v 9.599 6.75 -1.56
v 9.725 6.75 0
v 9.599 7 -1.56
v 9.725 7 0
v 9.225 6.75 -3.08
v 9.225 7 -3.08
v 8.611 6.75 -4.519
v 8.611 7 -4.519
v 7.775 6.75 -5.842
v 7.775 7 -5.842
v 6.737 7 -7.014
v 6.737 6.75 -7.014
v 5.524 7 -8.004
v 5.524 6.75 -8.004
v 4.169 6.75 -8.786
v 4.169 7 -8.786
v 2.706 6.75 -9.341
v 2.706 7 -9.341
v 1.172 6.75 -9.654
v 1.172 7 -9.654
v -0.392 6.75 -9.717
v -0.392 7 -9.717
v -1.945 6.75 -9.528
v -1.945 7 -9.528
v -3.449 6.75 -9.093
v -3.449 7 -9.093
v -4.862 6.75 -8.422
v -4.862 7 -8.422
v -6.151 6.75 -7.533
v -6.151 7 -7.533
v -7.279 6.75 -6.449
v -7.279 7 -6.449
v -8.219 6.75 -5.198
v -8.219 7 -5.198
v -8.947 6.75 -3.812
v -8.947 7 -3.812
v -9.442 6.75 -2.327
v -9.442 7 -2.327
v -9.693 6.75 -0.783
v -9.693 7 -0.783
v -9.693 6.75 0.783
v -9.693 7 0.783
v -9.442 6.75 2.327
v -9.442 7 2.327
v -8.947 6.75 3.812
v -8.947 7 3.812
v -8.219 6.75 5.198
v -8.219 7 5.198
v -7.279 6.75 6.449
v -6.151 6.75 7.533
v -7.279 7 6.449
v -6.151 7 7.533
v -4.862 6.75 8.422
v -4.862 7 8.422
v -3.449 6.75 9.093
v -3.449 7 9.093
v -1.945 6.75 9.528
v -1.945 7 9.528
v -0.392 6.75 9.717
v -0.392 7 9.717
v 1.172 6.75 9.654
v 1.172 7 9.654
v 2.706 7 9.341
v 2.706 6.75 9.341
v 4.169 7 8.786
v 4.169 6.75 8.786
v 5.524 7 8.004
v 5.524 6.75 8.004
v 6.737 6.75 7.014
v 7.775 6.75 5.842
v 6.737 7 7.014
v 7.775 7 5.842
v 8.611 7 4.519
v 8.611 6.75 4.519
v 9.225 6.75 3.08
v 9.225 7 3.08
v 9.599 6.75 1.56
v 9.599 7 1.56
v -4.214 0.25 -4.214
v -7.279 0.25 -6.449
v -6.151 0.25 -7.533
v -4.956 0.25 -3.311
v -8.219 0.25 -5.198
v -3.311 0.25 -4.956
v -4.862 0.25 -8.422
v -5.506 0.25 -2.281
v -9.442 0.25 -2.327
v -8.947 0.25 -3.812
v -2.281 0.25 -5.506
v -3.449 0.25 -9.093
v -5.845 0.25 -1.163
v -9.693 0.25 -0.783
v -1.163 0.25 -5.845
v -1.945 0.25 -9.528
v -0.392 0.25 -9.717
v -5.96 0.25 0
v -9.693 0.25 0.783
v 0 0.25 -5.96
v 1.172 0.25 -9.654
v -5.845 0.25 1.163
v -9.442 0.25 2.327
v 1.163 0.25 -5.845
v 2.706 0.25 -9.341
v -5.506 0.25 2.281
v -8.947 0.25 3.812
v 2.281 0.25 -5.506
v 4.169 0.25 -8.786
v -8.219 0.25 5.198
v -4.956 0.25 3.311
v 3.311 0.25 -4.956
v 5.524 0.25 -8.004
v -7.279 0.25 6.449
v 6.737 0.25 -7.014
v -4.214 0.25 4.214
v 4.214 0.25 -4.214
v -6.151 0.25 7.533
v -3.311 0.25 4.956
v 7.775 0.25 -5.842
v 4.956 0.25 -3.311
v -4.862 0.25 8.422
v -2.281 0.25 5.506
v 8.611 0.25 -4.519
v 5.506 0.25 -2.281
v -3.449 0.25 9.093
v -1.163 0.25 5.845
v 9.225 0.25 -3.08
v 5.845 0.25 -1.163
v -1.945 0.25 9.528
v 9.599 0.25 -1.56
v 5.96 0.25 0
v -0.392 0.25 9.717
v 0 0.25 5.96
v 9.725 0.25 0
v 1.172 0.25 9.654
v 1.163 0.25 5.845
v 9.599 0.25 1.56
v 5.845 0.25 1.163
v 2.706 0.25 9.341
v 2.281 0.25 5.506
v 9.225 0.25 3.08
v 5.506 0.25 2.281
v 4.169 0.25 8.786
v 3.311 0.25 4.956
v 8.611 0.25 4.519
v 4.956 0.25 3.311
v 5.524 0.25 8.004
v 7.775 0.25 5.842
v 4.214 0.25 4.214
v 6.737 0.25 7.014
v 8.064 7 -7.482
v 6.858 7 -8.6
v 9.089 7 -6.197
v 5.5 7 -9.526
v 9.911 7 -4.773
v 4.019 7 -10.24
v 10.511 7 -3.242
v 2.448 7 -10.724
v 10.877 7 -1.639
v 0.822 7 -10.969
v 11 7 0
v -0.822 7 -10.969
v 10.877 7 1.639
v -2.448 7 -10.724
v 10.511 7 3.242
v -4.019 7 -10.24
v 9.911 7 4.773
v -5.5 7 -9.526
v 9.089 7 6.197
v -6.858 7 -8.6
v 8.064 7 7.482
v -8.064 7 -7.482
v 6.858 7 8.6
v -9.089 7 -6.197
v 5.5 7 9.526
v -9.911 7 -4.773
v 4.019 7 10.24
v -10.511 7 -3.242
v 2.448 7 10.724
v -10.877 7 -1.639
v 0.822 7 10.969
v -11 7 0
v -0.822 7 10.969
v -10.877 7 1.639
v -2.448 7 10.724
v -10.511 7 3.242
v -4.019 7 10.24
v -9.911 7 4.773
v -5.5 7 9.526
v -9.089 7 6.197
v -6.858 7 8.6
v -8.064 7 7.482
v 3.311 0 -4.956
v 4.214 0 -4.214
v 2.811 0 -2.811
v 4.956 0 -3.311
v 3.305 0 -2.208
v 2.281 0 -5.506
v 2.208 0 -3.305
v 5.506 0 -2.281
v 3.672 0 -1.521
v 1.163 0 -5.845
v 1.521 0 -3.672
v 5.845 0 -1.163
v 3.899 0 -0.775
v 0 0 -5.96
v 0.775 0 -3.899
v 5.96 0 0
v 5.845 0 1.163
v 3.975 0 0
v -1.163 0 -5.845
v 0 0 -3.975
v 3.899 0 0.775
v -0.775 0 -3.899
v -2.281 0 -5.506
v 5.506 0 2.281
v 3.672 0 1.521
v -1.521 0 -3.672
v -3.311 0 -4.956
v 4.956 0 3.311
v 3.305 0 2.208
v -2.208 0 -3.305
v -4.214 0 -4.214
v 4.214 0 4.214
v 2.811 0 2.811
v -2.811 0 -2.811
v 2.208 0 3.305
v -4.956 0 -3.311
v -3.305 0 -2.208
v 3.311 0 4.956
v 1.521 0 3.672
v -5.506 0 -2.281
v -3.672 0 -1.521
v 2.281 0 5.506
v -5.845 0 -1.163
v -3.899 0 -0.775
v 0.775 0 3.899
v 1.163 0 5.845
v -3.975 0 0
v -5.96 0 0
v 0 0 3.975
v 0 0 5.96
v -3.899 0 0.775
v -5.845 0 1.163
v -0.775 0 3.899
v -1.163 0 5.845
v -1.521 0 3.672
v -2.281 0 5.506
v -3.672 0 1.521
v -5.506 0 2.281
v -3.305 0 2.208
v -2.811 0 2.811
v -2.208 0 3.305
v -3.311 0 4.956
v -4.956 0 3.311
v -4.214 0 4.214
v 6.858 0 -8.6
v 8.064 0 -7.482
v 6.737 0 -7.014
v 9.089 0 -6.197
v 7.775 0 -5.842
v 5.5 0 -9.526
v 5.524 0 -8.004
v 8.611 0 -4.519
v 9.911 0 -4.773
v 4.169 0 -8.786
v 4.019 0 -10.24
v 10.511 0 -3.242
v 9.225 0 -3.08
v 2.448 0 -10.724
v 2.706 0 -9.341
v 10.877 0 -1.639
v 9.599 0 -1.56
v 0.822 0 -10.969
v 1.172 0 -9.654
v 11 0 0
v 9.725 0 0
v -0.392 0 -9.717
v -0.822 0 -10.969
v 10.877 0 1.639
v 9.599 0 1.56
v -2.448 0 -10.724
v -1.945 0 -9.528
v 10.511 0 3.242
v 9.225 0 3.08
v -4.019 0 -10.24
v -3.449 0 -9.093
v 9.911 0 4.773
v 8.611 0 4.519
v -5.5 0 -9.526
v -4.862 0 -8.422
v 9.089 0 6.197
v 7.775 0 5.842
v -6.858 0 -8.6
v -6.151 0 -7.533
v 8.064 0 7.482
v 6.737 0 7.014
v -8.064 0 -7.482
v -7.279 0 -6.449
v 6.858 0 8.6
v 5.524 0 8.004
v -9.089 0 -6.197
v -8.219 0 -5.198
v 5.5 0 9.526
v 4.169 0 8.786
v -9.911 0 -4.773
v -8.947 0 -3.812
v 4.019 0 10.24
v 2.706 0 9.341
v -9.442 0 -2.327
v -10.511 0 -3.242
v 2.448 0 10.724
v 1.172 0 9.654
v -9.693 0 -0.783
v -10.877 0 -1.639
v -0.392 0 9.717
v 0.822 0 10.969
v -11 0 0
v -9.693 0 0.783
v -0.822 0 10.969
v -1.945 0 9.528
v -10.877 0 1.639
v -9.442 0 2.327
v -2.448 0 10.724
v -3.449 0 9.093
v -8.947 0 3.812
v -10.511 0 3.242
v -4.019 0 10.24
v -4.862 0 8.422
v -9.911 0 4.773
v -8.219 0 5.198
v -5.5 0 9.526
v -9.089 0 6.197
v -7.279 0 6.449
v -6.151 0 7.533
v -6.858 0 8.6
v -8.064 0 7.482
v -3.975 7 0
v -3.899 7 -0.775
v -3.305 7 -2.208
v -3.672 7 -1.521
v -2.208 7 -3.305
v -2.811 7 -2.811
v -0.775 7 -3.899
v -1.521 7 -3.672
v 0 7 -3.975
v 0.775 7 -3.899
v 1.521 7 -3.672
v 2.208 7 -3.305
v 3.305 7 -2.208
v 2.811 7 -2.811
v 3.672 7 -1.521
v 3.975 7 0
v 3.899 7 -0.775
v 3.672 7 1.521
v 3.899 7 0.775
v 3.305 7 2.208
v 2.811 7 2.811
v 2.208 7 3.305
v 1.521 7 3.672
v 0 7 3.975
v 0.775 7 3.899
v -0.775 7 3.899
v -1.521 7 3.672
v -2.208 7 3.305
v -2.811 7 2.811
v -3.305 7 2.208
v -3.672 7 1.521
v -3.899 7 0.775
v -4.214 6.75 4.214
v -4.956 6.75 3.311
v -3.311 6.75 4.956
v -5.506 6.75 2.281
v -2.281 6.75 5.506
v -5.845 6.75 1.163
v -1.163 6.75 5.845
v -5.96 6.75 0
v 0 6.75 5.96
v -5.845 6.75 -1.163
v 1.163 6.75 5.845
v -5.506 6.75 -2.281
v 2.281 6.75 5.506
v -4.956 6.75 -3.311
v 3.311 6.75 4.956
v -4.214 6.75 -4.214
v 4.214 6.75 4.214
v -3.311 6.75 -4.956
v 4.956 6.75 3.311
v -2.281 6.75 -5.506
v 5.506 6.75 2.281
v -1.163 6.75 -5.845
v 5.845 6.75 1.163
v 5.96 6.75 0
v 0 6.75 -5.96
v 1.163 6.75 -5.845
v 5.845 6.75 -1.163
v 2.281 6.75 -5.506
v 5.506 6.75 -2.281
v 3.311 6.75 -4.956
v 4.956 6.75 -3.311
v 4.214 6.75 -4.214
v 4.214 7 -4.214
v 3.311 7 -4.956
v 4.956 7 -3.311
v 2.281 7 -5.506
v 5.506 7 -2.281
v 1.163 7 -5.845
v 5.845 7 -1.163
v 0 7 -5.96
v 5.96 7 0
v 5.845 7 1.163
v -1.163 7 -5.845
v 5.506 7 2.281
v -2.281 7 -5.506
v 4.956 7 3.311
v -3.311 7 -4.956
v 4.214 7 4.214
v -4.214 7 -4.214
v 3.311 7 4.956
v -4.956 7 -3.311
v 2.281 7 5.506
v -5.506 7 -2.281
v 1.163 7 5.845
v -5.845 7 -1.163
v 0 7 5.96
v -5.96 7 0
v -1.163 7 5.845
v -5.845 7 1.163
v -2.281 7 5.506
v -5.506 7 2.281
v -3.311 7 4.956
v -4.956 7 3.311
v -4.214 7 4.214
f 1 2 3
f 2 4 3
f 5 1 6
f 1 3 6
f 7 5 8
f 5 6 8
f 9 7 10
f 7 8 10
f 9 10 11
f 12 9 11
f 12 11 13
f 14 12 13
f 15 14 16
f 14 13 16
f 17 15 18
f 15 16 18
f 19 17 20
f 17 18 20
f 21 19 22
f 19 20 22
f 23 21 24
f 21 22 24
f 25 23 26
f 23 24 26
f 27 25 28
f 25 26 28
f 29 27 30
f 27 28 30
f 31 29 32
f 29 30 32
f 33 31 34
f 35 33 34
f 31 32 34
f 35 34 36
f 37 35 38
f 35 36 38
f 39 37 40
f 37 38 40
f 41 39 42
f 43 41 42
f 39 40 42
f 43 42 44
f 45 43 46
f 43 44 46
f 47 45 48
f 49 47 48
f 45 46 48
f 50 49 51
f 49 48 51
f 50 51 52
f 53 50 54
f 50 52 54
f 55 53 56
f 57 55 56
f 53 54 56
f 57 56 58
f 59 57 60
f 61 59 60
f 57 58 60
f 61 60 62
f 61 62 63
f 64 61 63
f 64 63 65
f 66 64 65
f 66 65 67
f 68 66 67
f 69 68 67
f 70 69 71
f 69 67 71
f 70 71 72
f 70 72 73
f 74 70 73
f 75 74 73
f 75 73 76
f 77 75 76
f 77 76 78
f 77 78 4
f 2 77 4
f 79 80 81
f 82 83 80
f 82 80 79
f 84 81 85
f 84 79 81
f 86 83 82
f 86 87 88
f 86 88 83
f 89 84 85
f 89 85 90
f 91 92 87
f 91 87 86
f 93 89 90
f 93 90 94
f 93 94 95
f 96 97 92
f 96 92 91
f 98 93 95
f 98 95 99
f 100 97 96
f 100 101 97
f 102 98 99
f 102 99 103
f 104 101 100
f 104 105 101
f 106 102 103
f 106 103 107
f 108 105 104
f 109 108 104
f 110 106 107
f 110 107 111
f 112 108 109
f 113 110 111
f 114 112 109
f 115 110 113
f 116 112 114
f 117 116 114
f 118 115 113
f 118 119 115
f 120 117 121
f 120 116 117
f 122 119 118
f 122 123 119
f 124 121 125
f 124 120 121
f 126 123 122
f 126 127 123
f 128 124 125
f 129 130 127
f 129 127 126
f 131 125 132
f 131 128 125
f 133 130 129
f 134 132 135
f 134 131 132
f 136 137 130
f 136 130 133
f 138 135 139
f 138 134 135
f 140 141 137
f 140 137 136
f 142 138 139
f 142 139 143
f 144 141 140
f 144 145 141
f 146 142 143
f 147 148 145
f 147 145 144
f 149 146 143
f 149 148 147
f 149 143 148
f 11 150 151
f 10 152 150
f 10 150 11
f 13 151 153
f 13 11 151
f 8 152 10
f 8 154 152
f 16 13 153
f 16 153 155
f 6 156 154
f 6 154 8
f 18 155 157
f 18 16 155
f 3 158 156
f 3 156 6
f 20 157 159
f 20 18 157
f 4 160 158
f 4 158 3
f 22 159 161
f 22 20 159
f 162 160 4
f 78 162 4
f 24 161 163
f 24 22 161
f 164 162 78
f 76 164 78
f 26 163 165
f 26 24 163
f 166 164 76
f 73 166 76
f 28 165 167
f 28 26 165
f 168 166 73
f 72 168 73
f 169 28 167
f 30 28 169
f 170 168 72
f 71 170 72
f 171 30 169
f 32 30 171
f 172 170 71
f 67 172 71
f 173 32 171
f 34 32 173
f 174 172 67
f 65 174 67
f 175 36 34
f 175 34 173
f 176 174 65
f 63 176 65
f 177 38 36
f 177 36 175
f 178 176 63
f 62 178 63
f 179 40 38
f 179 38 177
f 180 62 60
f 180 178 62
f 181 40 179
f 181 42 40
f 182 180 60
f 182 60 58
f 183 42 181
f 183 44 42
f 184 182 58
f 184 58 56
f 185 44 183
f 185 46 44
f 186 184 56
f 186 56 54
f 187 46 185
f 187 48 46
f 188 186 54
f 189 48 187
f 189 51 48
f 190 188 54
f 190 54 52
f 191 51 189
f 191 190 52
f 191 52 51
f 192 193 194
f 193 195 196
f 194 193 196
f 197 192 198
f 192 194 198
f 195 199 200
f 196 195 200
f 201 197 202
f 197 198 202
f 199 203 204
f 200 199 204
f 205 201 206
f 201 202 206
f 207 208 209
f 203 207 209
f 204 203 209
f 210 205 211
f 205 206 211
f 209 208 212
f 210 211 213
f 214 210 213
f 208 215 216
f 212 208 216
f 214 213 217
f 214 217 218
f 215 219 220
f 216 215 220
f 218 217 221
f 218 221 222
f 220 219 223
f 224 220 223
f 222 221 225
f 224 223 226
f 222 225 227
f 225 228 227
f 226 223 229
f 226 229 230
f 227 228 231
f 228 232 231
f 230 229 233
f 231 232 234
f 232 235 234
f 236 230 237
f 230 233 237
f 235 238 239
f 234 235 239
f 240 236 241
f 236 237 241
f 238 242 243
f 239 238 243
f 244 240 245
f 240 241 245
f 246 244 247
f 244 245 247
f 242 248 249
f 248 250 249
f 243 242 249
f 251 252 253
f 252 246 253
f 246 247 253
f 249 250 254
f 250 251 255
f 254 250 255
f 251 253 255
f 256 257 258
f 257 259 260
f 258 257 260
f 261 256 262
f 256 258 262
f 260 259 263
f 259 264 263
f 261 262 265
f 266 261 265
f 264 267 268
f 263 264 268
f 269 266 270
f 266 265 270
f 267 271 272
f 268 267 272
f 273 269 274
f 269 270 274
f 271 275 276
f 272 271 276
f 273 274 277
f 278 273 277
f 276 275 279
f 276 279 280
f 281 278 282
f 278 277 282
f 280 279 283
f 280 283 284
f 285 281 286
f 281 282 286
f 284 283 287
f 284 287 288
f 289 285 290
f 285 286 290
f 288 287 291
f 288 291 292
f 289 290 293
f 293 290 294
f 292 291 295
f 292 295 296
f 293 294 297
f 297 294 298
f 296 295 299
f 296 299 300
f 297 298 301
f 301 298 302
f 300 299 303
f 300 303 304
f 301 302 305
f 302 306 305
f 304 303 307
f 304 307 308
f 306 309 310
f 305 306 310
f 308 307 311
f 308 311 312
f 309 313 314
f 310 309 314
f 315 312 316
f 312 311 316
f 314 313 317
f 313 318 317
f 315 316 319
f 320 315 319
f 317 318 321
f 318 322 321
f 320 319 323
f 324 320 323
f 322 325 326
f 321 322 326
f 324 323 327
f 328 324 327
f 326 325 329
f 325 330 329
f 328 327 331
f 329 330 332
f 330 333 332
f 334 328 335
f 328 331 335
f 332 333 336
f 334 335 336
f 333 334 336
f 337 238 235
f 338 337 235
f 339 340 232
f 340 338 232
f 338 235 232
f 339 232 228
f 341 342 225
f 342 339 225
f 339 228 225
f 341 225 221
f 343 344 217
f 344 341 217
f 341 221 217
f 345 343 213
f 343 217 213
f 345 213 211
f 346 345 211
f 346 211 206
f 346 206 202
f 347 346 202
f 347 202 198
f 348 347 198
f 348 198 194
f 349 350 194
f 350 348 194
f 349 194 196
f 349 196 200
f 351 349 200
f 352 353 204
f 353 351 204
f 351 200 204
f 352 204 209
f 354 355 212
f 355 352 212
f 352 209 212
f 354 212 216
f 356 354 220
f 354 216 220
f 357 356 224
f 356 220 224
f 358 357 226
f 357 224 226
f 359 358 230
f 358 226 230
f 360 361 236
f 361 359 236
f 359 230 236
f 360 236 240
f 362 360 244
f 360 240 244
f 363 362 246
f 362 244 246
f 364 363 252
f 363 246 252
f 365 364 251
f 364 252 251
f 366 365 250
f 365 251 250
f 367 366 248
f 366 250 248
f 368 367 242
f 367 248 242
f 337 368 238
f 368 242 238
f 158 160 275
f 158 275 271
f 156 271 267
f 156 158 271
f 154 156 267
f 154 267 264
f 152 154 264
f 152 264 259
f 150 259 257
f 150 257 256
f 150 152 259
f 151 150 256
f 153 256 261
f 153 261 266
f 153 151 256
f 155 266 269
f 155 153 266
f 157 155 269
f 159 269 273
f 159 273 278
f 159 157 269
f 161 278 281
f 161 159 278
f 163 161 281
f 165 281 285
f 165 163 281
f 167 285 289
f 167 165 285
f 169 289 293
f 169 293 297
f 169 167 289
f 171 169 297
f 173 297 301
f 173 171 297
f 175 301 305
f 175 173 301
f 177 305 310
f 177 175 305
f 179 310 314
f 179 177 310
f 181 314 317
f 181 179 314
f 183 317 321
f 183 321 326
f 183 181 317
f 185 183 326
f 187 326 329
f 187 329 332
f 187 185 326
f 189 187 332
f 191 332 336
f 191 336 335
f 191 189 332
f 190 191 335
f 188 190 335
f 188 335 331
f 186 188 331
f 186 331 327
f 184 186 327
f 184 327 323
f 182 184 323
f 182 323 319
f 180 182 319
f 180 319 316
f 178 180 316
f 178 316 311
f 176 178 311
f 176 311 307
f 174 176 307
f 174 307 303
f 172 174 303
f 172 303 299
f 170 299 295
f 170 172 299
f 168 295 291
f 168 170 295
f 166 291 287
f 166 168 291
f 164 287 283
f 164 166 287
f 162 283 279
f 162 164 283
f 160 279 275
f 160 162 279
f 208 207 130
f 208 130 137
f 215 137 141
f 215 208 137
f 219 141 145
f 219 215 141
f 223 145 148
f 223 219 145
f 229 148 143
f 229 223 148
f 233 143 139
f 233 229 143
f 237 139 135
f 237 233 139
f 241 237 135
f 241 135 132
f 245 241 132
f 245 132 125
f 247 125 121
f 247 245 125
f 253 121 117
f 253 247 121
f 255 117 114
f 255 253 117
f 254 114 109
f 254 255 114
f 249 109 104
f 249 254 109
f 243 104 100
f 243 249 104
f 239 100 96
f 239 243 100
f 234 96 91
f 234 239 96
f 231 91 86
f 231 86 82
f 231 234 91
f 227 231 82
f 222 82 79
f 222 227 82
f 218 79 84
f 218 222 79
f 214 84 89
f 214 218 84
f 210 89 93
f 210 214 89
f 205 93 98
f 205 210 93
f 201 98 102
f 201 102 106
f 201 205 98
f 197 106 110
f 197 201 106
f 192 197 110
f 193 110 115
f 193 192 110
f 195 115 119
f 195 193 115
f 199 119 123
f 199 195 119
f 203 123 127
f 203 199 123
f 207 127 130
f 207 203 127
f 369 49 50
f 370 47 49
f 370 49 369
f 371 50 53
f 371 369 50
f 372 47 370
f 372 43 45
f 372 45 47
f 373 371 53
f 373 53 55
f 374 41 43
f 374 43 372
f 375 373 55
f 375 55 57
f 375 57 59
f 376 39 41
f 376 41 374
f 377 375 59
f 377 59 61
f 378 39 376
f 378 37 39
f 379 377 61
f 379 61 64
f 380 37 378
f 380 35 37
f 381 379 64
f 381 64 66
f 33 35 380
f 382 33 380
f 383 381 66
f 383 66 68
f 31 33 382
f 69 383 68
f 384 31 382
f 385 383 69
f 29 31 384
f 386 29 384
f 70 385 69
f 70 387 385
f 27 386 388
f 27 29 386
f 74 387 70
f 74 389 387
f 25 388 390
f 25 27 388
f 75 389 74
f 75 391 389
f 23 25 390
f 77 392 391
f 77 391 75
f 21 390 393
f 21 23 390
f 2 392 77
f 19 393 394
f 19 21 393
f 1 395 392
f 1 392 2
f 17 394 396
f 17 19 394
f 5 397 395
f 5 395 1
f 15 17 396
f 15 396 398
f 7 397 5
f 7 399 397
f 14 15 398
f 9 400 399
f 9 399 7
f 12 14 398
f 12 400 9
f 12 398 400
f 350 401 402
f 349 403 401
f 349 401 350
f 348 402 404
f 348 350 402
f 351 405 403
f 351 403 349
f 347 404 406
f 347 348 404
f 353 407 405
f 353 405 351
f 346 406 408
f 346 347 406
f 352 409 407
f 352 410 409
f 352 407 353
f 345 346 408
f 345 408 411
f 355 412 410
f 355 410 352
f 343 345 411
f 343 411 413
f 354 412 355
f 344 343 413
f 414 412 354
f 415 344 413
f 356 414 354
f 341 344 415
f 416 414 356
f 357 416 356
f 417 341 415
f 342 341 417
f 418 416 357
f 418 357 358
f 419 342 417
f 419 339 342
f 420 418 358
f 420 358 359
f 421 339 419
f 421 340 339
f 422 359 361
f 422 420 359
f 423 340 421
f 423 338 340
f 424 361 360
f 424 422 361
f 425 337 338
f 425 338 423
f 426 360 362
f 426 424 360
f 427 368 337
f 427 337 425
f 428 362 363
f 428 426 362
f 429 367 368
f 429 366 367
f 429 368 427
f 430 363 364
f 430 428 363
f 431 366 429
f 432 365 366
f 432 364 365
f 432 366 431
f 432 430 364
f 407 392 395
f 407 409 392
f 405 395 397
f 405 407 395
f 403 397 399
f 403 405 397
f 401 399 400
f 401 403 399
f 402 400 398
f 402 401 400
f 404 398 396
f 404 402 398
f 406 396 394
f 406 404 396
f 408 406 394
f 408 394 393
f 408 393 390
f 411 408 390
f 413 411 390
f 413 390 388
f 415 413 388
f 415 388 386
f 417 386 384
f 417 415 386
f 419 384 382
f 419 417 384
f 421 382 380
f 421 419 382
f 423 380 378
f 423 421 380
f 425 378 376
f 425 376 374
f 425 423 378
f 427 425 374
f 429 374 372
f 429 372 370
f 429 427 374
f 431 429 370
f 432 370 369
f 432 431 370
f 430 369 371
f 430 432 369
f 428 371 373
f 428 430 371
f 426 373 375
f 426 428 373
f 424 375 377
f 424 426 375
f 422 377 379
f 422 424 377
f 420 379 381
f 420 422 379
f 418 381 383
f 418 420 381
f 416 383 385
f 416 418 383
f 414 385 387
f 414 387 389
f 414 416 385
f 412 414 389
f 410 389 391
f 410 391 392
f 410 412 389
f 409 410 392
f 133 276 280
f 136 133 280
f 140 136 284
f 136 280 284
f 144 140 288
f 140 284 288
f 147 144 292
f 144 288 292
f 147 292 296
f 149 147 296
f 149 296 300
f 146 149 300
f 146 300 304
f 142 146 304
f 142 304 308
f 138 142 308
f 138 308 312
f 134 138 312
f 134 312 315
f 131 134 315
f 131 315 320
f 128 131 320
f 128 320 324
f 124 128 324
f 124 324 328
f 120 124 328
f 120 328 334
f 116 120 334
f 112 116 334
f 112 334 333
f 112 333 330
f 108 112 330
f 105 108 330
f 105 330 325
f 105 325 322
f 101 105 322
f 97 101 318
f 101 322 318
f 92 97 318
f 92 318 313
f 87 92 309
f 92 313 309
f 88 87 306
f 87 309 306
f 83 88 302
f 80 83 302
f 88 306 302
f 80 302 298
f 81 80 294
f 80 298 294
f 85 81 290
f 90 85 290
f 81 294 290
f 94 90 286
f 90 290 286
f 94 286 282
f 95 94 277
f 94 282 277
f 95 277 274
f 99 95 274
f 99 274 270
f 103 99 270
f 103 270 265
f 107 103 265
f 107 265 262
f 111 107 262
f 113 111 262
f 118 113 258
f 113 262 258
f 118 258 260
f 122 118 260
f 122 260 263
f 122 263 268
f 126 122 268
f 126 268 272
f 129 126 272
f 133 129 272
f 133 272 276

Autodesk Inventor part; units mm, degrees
ref_plane "YZ Plane" through (0, 0, 0) normal (1, 0, 0) x (0, 1, 0)
ref_plane "XZ Plane" through (0, 0, 0) normal (0, 1, 0) x (-1, 0, 0)
ref_plane "XY Plane" through (0, 0, 0) normal (0, 0, 1) x (1, 0, 0)
sketch "Sketch1" plane through (0, 0, 0) normal (0, 1, 0) x (-1, 0, 0)
  circle A0 centre (0, 0) radius 3.975
  circle A1 centre (0, 0) radius 5.965
  dimension "d0" = 7.95
  dimension "d1" = 11.93
extrude "Extrusion1" add sketch "Sketch1" along normal blind 7
sketch "Sketch2" plane through (0, 7, 0) normal (0, 1, 0) x (1, 0, 0)
  circle A0 centre (0, 0) radius 5.965 projected
  circle A1 centre (0, 0) radius 11
  dimension "d4" = 22
extrude "Extrusion2" add sketch "Sketch2" against normal up to surface (7 mm away)
sketch "Sketch3" plane through (0, 0, 0) normal (0, -1, 0) x (1, 0, 0)
  circle A0 centre (0, 0) radius 5.96
  circle A1 centre (0, 0) radius 9.725
  dimension "d7" = 11.92
  dimension "d8" = 19.45
extrude "Extrusion3" cut sketch "Sketch3" against normal blind 0.25
sketch "Sketch4" plane through (0, 7, 0) normal (0, 1, 0) x (1, 0, 0)
  circle A0 centre (0, 0) radius 5.96 projected
  circle A1 centre (0, 0) radius 9.725 projected
  circle A2 centre (0, 0) radius 5.96 projected
  circle A3 centre (0, 0) radius 9.725 projected
extrude "Extrusion4" cut sketch "Sketch4" against normal blind 0.25
properties part number "bearing_1"
